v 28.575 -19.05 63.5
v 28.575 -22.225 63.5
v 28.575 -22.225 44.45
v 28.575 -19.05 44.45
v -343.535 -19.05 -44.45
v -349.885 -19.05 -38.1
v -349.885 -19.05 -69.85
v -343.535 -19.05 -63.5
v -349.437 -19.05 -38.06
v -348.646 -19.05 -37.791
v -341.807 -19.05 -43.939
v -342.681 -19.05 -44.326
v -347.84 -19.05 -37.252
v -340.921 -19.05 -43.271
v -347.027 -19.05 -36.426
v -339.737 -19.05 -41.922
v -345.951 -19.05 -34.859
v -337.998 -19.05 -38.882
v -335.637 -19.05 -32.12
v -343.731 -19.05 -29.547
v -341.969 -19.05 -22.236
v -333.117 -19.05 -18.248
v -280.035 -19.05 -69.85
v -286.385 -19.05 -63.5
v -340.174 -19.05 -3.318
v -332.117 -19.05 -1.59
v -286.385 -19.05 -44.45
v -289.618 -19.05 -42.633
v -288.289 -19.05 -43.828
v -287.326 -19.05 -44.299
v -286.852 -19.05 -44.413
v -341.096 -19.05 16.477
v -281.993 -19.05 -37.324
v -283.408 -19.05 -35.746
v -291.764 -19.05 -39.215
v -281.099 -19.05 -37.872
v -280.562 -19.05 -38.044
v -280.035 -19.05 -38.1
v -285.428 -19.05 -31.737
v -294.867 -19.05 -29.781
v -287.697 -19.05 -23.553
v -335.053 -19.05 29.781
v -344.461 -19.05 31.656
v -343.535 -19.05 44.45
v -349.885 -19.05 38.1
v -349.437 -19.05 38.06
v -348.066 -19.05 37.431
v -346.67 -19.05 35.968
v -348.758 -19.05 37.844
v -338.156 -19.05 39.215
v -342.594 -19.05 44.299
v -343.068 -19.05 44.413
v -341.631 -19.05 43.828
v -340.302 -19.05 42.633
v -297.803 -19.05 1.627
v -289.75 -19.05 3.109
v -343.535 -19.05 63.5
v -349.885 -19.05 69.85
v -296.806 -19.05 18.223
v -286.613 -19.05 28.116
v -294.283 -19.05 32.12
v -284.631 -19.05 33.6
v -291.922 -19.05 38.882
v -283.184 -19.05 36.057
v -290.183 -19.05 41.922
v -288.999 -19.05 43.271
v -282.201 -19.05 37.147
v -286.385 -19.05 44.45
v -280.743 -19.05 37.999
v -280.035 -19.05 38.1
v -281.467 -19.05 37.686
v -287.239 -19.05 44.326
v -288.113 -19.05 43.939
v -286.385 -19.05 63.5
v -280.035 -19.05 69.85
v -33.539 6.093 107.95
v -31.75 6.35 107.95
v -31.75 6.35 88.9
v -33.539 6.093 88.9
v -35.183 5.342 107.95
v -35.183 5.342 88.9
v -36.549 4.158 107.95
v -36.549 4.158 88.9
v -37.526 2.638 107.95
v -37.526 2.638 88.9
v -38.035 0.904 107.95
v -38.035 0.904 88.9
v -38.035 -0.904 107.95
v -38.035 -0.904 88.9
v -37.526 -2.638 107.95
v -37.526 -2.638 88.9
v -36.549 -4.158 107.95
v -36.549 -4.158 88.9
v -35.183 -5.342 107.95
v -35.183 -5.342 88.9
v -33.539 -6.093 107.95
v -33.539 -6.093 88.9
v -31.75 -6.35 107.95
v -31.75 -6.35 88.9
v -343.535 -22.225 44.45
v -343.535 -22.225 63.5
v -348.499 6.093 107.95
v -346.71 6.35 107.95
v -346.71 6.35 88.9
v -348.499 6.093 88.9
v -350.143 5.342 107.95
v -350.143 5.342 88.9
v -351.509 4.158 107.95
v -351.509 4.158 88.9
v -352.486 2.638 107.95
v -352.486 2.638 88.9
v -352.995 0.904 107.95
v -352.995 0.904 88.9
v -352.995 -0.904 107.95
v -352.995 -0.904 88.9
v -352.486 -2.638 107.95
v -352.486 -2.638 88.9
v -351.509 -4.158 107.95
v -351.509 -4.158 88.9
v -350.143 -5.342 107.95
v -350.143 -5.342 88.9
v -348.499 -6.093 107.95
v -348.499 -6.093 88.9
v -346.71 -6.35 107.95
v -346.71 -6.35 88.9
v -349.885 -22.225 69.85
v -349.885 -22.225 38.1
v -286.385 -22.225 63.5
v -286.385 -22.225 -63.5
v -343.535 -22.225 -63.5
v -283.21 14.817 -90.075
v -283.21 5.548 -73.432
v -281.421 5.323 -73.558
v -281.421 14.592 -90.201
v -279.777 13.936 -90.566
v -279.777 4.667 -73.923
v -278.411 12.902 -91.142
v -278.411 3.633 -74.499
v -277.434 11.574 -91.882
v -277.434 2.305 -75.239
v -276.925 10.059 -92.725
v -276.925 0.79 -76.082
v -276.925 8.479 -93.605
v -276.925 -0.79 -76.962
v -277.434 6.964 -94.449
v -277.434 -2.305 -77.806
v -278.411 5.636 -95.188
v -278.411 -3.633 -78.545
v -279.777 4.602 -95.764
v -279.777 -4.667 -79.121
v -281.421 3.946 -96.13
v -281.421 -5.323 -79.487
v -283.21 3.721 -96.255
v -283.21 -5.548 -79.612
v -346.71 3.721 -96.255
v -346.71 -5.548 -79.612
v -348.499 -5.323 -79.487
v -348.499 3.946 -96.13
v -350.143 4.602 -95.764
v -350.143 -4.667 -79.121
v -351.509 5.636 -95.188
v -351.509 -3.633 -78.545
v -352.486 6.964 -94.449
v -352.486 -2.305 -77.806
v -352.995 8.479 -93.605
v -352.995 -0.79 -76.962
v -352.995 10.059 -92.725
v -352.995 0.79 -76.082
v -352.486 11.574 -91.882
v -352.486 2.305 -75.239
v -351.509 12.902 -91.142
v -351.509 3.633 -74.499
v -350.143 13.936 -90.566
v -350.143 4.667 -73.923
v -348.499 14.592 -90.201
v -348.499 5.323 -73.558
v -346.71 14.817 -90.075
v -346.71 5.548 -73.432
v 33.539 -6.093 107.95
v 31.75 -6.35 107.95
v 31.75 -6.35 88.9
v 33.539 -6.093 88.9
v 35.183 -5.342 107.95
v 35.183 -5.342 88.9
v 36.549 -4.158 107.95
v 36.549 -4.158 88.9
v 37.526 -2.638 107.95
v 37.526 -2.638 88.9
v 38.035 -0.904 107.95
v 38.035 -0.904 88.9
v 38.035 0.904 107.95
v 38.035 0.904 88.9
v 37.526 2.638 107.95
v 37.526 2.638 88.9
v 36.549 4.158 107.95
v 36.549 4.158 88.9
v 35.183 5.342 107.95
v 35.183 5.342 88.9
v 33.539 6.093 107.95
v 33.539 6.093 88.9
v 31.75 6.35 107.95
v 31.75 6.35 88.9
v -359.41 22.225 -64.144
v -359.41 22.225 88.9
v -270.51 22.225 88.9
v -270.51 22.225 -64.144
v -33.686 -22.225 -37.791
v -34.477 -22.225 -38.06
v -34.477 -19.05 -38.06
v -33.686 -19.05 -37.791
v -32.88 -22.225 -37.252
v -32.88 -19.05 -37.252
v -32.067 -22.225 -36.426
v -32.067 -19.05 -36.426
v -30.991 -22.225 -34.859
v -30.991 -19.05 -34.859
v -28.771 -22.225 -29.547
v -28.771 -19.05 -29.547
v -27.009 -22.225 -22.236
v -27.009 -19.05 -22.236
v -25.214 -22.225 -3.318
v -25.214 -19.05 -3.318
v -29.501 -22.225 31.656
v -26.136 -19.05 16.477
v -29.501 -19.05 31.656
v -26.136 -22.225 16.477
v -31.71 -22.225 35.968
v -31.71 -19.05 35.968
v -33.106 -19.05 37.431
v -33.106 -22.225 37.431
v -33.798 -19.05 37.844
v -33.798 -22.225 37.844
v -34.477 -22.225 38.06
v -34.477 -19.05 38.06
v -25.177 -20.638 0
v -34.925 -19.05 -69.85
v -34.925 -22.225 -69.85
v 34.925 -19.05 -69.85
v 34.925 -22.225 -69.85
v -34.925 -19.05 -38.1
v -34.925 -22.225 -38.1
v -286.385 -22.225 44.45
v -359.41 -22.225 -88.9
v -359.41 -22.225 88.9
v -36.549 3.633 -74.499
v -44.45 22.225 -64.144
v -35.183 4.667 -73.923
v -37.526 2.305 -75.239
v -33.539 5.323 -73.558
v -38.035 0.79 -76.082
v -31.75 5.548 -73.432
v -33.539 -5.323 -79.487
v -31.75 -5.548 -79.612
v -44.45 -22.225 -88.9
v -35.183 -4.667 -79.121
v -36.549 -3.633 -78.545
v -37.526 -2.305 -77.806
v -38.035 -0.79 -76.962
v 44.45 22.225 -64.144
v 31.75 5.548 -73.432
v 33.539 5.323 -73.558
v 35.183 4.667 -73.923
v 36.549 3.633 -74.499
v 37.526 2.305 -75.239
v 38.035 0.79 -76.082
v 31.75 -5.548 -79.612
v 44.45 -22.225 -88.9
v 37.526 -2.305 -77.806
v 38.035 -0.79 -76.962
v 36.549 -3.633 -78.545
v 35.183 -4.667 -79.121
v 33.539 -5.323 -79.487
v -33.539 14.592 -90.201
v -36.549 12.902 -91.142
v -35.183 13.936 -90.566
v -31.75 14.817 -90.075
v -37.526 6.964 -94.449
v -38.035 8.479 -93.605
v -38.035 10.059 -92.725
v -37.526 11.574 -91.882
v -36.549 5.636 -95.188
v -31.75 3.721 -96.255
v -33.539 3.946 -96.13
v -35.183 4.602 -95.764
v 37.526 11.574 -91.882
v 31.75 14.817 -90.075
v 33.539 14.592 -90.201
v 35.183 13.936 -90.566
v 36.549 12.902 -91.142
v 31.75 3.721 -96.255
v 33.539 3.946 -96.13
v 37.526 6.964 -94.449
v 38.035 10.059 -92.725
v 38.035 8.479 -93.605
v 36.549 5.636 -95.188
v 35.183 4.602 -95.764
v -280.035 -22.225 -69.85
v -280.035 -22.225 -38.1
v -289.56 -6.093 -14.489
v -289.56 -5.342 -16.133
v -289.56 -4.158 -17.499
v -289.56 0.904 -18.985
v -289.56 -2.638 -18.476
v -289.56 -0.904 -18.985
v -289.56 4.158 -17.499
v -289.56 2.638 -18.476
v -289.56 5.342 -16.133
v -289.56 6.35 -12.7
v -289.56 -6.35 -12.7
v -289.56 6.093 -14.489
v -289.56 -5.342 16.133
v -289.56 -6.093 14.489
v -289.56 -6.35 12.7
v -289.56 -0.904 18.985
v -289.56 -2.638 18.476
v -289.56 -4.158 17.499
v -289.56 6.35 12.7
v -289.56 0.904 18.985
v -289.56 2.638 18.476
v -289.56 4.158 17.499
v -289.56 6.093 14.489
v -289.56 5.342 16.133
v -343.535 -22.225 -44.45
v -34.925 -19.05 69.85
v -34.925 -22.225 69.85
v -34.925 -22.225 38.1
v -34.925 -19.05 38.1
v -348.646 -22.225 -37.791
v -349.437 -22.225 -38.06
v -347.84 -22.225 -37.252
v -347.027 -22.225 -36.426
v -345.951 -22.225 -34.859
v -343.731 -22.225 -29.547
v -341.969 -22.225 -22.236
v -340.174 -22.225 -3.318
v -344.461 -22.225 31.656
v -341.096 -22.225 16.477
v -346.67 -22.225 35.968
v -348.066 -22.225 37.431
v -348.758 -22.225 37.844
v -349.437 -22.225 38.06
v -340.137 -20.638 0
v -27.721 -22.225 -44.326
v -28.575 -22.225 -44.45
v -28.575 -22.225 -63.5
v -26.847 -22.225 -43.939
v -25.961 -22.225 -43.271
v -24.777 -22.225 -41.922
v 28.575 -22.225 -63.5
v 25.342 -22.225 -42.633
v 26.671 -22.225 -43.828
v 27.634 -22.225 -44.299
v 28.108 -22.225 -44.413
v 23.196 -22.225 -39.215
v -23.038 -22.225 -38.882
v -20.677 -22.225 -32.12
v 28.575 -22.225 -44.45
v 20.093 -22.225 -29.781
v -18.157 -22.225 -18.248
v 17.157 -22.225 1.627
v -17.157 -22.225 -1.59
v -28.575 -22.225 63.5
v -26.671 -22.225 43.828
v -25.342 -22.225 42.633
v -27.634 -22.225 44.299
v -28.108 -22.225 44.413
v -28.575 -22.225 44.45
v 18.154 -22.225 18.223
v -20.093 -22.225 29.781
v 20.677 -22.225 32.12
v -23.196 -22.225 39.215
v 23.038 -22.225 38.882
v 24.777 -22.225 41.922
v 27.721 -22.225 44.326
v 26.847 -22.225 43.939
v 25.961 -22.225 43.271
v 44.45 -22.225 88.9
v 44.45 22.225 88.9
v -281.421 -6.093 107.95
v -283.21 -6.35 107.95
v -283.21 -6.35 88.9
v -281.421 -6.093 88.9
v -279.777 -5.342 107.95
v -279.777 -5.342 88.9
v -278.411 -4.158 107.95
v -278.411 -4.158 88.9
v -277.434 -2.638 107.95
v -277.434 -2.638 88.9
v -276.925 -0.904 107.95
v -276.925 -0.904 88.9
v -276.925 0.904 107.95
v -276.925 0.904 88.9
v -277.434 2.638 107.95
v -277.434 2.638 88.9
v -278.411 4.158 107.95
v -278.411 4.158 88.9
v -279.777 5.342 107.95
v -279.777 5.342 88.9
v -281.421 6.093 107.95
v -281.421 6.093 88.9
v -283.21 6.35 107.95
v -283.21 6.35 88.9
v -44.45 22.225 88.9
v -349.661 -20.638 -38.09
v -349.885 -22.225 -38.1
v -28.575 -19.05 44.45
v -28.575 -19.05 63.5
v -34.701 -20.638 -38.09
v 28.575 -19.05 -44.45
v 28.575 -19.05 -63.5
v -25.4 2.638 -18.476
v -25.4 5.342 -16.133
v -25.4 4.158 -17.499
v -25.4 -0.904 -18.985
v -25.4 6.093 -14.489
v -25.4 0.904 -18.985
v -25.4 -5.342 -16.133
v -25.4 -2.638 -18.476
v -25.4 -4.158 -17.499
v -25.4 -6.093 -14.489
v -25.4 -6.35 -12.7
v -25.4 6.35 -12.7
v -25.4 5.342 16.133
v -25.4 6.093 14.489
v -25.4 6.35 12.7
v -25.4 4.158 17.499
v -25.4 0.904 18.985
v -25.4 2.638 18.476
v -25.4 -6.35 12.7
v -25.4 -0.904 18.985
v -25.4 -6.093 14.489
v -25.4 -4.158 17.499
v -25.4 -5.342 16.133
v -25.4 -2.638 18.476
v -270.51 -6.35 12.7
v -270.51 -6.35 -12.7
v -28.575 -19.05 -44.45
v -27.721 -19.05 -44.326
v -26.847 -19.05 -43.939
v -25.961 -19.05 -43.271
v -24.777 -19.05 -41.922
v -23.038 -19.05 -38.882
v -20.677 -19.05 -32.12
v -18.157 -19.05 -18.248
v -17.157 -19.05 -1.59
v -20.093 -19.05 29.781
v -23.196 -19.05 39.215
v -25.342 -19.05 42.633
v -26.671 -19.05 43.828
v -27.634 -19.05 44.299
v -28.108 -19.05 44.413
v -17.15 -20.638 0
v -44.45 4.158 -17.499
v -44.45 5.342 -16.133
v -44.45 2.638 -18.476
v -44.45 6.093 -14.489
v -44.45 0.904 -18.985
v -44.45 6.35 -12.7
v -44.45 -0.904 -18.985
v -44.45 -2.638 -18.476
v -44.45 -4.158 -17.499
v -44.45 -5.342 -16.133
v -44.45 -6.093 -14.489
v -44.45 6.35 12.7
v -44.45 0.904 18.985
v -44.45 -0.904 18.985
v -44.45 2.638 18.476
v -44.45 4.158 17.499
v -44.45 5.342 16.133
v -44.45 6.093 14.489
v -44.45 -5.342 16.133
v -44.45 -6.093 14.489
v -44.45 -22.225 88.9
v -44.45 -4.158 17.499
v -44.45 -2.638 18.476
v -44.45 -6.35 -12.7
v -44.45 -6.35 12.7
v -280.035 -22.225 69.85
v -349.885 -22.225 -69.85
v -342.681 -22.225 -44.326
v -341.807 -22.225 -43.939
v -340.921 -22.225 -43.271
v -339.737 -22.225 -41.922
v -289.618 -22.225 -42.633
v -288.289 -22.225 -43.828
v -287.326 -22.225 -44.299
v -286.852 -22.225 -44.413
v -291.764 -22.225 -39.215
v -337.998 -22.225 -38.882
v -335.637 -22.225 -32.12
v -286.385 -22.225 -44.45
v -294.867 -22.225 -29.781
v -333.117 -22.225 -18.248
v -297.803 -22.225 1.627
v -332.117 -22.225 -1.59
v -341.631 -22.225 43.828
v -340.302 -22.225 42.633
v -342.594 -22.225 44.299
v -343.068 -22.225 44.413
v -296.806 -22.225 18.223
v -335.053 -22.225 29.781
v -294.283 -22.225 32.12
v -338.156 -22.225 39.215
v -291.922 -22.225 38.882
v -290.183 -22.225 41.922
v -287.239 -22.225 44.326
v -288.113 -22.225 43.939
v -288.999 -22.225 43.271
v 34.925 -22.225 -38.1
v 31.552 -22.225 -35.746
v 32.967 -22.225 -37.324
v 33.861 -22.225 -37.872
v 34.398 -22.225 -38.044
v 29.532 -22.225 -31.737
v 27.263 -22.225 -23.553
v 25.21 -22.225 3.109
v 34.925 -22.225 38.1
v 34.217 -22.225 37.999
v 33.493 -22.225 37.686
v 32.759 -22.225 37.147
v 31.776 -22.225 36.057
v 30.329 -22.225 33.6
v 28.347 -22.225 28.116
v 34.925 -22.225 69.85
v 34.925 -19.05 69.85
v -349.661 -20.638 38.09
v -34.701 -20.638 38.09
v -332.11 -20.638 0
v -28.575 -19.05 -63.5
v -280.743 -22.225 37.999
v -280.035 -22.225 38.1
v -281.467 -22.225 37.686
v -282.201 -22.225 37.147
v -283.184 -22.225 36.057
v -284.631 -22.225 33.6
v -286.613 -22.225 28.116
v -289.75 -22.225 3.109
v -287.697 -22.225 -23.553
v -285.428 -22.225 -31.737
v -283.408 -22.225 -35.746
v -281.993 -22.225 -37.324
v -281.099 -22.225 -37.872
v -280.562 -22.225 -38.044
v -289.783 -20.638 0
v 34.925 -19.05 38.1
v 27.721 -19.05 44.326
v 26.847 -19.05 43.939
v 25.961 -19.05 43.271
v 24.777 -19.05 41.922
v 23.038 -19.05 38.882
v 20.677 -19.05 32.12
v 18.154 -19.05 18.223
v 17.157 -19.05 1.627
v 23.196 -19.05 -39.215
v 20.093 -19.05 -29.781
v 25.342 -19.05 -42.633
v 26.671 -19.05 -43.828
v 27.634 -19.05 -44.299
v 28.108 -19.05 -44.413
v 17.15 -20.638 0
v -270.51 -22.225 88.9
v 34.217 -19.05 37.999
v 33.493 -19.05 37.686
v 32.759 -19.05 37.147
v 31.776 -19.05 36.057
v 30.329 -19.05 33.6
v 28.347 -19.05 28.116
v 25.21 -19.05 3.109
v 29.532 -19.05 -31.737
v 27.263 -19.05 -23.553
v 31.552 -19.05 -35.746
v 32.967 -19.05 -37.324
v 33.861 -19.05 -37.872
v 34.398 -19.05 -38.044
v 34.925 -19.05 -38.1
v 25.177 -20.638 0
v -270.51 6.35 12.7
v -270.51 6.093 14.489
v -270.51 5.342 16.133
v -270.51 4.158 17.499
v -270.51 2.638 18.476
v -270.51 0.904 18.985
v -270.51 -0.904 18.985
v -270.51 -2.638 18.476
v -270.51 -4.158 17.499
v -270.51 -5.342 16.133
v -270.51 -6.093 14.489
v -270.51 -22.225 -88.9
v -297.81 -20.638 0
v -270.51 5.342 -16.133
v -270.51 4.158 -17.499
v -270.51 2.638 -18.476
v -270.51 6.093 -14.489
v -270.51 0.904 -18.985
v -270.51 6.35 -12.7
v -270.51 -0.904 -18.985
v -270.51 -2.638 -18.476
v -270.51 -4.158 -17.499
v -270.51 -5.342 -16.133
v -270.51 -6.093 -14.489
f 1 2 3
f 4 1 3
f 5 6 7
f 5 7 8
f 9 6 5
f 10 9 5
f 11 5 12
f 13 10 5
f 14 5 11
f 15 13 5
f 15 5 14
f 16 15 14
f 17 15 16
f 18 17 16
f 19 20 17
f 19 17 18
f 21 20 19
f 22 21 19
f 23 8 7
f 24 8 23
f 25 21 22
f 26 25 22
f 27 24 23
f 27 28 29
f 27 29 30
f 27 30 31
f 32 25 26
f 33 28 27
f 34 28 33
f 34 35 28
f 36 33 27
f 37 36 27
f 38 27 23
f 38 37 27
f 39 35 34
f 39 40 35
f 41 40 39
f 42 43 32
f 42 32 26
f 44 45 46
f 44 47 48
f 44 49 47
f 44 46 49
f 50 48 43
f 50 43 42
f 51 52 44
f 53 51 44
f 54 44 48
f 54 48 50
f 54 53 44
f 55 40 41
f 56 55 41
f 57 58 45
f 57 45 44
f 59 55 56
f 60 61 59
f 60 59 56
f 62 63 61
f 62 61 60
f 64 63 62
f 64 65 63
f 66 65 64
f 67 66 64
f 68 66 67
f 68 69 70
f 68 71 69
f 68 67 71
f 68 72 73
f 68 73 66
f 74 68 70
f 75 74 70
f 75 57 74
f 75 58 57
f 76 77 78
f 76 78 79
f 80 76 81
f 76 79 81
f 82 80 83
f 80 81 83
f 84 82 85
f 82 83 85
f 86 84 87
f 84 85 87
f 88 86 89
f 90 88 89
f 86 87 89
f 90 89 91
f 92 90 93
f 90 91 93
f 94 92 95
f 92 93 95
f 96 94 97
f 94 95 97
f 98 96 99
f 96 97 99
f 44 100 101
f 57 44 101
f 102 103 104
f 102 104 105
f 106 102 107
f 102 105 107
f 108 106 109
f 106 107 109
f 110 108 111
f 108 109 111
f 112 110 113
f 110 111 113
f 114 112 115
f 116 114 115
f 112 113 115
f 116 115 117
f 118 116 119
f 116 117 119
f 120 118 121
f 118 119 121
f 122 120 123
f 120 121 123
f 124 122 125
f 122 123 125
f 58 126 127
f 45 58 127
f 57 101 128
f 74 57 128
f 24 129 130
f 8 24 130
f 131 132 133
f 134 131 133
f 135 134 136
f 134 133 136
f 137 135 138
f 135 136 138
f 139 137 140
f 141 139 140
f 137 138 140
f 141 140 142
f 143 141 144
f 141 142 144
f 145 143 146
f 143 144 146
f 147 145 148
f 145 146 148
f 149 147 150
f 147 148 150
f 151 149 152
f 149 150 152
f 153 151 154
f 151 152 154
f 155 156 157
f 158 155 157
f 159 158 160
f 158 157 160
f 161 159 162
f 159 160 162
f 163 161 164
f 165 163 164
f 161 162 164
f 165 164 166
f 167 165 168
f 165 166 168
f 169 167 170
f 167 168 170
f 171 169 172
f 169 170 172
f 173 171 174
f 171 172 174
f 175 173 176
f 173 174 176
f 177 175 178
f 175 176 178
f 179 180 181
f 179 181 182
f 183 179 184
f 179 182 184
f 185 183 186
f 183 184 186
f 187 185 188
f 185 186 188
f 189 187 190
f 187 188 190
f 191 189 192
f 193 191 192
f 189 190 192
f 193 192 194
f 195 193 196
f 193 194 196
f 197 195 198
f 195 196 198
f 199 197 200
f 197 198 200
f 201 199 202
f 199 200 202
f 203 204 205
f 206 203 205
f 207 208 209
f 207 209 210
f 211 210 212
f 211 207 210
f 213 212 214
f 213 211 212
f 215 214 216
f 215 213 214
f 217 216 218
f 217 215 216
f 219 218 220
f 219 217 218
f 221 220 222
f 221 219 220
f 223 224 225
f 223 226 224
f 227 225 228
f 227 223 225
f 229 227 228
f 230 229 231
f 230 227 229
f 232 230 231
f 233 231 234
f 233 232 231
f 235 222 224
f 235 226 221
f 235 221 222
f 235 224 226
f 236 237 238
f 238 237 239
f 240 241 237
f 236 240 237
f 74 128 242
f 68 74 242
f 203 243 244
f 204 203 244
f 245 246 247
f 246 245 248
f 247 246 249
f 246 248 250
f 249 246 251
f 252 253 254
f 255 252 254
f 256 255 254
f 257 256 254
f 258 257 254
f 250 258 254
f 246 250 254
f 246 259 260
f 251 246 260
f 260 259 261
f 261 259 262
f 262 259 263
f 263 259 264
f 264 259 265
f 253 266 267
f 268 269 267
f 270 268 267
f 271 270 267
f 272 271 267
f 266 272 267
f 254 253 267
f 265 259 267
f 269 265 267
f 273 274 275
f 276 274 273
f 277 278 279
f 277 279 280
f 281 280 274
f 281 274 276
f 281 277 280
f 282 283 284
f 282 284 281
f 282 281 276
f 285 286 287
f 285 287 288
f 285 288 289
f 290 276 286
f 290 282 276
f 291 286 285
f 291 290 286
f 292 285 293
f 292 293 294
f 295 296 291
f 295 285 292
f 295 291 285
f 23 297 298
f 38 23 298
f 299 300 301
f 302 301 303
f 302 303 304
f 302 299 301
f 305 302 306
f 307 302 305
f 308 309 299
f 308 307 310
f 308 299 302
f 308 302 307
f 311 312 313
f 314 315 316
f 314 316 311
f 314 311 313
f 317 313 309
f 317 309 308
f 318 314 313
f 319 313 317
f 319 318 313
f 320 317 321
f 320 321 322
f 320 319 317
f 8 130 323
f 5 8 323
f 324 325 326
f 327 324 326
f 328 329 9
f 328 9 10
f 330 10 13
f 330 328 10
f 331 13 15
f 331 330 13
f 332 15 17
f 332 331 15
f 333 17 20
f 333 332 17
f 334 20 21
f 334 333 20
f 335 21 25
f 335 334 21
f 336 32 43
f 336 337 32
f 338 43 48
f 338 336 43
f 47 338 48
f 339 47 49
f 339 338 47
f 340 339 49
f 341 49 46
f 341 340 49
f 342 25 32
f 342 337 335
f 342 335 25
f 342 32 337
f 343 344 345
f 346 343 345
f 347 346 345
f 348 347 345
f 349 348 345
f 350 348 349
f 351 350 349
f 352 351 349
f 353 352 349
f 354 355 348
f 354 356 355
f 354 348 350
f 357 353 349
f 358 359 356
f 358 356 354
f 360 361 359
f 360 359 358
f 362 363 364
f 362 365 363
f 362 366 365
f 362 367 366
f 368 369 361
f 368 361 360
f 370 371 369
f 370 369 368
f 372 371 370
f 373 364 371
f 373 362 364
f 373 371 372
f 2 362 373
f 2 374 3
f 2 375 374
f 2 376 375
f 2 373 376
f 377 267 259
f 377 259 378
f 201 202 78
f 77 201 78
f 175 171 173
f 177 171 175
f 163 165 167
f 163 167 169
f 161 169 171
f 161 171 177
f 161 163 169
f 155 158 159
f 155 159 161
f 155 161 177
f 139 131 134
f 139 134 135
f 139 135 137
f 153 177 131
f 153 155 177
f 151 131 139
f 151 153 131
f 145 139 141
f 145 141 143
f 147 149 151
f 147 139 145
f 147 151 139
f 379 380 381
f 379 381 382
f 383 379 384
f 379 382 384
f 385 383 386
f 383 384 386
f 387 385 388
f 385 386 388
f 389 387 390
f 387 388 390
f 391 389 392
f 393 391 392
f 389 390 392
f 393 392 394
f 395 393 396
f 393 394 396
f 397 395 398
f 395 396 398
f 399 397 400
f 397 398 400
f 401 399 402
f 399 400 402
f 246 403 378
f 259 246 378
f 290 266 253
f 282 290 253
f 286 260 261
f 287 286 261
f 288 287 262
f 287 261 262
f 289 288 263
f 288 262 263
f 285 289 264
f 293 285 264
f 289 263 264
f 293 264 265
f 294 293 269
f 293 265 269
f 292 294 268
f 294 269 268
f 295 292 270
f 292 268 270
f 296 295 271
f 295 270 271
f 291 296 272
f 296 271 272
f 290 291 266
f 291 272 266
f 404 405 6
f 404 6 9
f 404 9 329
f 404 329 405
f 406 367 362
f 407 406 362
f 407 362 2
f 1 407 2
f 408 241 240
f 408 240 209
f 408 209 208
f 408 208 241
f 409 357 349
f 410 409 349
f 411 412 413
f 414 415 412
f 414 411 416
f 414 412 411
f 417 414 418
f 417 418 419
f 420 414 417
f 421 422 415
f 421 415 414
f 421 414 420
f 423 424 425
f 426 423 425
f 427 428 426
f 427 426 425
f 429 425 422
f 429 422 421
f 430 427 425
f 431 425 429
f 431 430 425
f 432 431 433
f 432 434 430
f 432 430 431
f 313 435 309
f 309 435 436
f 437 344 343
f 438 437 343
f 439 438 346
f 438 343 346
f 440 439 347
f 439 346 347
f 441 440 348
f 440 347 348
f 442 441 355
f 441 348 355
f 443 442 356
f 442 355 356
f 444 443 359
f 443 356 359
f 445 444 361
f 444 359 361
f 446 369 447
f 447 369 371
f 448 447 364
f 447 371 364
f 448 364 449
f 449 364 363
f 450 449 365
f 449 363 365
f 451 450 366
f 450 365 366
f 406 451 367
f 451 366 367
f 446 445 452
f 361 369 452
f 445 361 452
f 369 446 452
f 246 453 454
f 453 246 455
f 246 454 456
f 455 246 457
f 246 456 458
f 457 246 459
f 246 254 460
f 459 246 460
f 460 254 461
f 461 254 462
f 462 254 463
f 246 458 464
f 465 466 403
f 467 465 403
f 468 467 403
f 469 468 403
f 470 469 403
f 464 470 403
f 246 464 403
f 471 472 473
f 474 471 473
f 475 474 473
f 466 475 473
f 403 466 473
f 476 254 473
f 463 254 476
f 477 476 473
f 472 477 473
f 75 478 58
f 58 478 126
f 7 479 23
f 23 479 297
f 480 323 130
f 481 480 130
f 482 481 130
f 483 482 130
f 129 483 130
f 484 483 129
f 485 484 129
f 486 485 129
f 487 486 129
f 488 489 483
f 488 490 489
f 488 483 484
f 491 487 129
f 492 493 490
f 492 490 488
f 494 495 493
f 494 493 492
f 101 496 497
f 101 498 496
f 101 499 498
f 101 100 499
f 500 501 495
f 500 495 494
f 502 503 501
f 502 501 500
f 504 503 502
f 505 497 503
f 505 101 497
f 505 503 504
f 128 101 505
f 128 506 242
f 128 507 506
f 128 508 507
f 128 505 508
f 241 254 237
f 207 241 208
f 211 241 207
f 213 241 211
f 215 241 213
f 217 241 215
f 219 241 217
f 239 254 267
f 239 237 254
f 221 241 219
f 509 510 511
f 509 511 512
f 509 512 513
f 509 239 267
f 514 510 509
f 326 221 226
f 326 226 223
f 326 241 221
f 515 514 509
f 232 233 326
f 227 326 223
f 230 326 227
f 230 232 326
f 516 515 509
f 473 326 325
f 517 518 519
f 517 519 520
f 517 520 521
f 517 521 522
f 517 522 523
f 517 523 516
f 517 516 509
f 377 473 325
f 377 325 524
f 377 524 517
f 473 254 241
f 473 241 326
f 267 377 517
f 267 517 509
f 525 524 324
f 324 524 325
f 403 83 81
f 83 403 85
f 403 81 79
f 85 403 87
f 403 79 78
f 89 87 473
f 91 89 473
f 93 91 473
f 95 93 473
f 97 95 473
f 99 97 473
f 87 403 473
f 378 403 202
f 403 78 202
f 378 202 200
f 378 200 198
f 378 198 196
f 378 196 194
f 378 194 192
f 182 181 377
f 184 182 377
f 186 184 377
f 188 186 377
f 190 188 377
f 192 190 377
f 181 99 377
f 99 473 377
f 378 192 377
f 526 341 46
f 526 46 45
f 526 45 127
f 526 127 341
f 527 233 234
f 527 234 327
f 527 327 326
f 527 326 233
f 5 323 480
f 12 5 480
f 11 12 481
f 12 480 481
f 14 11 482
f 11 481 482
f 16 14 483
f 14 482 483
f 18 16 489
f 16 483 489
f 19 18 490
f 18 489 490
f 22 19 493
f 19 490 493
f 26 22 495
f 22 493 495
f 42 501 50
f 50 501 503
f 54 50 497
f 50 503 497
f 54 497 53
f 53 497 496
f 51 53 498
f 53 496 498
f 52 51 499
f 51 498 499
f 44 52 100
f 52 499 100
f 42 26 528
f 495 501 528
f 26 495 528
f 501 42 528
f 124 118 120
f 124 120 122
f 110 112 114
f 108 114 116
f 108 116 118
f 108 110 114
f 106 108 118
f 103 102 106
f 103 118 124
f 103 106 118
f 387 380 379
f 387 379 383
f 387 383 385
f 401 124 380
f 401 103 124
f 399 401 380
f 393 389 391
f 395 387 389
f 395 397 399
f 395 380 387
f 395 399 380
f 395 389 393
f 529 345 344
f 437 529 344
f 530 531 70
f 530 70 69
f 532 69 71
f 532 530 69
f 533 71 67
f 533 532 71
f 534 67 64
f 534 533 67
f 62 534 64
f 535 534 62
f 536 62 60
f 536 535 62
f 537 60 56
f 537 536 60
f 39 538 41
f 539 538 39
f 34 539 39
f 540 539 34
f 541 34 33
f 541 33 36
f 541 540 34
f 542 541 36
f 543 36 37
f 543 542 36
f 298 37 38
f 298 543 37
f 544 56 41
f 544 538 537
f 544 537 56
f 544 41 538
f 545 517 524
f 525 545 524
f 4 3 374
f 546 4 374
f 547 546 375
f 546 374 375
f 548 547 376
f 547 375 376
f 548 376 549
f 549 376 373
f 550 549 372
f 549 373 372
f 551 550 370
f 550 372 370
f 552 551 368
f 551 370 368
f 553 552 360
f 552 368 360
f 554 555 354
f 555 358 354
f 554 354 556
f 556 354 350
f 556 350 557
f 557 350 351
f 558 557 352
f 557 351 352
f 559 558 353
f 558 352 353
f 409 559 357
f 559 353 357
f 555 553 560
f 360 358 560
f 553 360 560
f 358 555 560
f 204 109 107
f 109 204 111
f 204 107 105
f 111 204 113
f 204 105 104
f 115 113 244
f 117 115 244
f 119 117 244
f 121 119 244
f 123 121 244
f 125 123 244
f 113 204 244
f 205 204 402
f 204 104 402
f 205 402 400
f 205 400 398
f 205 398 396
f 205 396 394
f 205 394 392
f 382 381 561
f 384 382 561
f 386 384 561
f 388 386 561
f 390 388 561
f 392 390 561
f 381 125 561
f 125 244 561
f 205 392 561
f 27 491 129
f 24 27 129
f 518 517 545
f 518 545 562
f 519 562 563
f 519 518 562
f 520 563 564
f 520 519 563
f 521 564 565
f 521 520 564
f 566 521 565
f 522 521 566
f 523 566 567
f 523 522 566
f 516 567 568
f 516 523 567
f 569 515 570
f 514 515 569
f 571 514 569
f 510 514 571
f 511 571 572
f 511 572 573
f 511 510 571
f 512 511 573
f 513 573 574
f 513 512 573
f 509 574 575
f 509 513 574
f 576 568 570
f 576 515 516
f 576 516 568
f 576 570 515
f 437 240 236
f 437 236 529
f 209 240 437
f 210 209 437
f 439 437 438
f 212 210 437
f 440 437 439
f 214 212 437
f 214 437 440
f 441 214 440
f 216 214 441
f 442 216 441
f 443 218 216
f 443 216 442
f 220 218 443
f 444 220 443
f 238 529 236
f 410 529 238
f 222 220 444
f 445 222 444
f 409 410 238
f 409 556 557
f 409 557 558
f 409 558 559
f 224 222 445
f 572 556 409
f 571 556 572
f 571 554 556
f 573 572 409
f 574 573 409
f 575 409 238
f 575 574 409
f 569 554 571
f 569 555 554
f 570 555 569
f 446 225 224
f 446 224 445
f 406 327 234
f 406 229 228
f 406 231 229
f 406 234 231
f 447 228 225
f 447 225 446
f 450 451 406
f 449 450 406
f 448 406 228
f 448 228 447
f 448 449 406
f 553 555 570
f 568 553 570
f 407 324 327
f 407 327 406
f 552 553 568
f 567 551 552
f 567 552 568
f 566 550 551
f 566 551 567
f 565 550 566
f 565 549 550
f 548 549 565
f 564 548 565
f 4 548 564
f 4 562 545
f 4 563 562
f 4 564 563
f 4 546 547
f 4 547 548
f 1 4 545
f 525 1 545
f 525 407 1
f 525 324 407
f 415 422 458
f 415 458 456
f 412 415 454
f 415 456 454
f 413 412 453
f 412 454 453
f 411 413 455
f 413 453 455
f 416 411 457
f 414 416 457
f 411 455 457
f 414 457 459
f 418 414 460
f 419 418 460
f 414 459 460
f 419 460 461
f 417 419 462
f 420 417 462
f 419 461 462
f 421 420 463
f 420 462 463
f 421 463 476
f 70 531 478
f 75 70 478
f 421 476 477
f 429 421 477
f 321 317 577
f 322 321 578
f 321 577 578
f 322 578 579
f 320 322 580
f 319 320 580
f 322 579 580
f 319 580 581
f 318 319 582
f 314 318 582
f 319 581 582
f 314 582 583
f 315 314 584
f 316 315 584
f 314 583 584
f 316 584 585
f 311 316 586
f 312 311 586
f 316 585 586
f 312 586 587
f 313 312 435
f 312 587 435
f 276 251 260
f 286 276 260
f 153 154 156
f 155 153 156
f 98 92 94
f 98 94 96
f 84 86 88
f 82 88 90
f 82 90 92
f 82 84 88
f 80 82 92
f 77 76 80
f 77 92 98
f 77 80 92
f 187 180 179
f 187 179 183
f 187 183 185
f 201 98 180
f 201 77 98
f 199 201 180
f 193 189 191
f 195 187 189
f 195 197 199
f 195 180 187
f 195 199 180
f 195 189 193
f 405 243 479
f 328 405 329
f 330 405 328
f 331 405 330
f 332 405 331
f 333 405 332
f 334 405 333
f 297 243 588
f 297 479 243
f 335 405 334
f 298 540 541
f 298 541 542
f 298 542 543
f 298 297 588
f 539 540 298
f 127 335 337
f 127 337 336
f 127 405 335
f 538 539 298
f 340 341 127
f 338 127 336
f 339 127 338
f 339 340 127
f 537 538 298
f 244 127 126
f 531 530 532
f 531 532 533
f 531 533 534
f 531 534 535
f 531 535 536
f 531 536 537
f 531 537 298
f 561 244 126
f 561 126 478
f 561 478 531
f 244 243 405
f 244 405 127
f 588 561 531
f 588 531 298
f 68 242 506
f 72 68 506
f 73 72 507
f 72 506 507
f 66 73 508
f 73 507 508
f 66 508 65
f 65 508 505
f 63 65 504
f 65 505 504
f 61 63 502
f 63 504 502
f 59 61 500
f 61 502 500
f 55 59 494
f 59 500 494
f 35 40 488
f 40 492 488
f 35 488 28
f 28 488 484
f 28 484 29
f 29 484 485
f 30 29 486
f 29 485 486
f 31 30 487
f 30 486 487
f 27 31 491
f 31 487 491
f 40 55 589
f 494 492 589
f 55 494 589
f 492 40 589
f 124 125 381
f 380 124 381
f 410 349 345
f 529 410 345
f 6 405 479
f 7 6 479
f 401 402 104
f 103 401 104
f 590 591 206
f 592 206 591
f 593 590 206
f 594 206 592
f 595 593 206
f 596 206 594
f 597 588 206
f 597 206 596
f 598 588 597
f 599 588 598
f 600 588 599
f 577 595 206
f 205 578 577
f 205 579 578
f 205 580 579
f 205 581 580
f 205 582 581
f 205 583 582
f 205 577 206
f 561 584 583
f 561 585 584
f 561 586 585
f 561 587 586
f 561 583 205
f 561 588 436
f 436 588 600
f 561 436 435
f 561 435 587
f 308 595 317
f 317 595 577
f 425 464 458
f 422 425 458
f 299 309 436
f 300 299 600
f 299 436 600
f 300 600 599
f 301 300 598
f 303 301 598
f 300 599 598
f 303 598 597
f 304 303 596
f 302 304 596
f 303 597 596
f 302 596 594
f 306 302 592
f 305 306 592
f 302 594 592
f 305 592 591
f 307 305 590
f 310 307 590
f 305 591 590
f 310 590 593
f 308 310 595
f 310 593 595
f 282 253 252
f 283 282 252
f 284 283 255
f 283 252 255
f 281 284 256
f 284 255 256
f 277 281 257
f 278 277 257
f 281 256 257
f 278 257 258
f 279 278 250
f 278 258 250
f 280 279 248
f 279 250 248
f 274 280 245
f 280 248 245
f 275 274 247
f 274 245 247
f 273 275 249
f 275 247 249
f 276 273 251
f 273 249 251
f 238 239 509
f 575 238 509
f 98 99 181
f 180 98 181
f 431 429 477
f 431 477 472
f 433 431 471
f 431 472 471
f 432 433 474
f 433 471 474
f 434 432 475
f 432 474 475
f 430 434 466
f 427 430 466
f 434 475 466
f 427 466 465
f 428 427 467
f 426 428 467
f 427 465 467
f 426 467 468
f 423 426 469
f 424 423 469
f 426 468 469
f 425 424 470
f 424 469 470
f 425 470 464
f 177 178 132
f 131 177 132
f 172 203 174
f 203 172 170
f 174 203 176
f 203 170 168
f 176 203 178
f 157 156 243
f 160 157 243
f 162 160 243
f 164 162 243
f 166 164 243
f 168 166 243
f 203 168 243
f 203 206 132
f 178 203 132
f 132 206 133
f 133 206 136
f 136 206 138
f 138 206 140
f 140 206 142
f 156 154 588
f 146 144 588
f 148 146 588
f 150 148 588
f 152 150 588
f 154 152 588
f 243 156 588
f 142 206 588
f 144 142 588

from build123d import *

# Parameters (mm, degrees)
F0_W      = 88.9
F0_H      = 177.8
F1_DEPTH  = 22.225
F3_DEPTH  = 19.05
F5_DEPTH  = 3.175
F7_DEPTH  = 88.9
F9_DEPTH  = 19.05
F12_DEPTH = 19.05
F14_DEPTH = 19.05


with BuildPart() as f1:
    # F0 (on Front) → F1 (new body, symmetric)
    with BuildSketch(Plane.XZ):
        Rectangle(F0_W, F0_H)
    extrude(amount=F1_DEPTH, both=True)

    # F2 (on face) → F3 (join)
    with BuildSketch(Plane.XY.offset(88.9)):
        with BuildLine():
            Line((31.75, 6.35), (-31.75, 6.35))
            ThreePointArc((-31.75, 6.35), (-38.1, 0), (-31.75, -6.35))
            Line((-31.75, -6.35), (31.75, -6.35))
            ThreePointArc((31.75, -6.35), (38.1, 0), (31.75, 6.35))
        make_face()
    extrude(amount=F3_DEPTH)

    # F4 (on face) → F5 (cut)
    with BuildSketch(Plane.XZ.offset(22.225)):
        with BuildLine():
            Line((34.925, 69.85), (-34.925, 69.85))
            Line((-34.925, 69.85), (-34.925, 38.1))
            add(Edge.make_bspline(
                [(-34.4770654637, 38.0597534694), (-34.7009143766, 38.1), (-34.925, 38.1)],
                knots=[6.2372173746, 6.2372173746, 6.2372173746, 6.2831853072, 6.2831853072, 6.2831853072], degree=2, weights=[1, 0.9997358803, 1]))
            add(Edge.make_bspline(
                [(-34.4770654637, -38.0597534694), (-25.1770670159, -36.3876762294), (-25.1770670159, 0), (-25.1770670159, 36.3876762294), (-34.4770654637, 38.0597534694)],
                knots=[3.1875605862, 3.1875605862, 3.1875605862, 4.7123889804, 4.7123889804, 6.2372173746, 6.2372173746, 6.2372173746], degree=2, weights=[1, 0.7231707079, 1, 0.7231707079, 1]))
            add(Edge.make_bspline(
                [(-34.925, -38.1), (-34.7009143766, -38.1), (-34.4770654637, -38.0597534694)],
                knots=[3.1415926536, 3.1415926536, 3.1415926536, 3.1875605862, 3.1875605862, 3.1875605862], degree=2, weights=[1, 0.9997358803, 1]))
            Line((-34.925, -38.1), (-34.925, -69.85))
            Line((-34.925, -69.85), (34.925, -69.85))
            Line((34.925, -69.85), (34.925, -38.1))
            add(Edge.make_bspline(
                [(34.925, 38.1), (25.1770670159, 38.1), (25.1770670159, 0), (25.1770670159, -38.1), (34.925, -38.1)],
                knots=[0, 0, 0, 1.5707963268, 1.5707963268, 3.1415926536, 3.1415926536, 3.1415926536], degree=2, weights=[1, 0.7071067812, 1, 0.7071067812, 1]))
            Line((34.925, 38.1), (34.925, 69.85))
        make_face()
        with BuildLine():
            Line((-28.575, 44.45), (-28.575, 63.5))
            Line((-28.575, 63.5), (28.575, 63.5))
            Line((28.575, 63.5), (28.575, 44.45))
            add(Edge.make_bspline(
                [(28.575, 44.45), (17.149786189, 44.45), (17.149786189, 0), (17.149786189, -44.45), (28.575, -44.45)],
                knots=[0, 0, 0, 1.5707963268, 1.5707963268, 3.1415926536, 3.1415926536, 3.1415926536], degree=2, weights=[1, 0.7071067812, 1, 0.7071067812, 1]))
            Line((28.575, -44.45), (28.575, -63.5))
            Line((28.575, -63.5), (-28.575, -63.5))
            Line((-28.575, -63.5), (-28.575, -44.45))
            add(Edge.make_bspline(
                [(-28.575, -44.45), (-17.149786189, -44.45), (-17.149786189, 0), (-17.149786189, 44.45), (-28.575, 44.45)],
                knots=[3.1415926536, 3.1415926536, 3.1415926536, 4.7123889804, 4.7123889804, 6.2831853072, 6.2831853072, 6.2831853072], degree=2, weights=[1, 0.7071067812, 1, 0.7071067812, 1]))
        make_face(mode=Mode.SUBTRACT)
    extrude(amount=-F5_DEPTH, mode=Mode.SUBTRACT)

    # F6 (on face) → F7 (cut)
    with BuildSketch(Plane.YZ.offset(44.45)):
        Polygon((22.225, -64.1443201671), (-22.225, -88.9), (22.225, -88.9), align=None)
    extrude(amount=-F7_DEPTH, mode=Mode.SUBTRACT)

    # F8 (on face) → F9 (join)
    with BuildSketch(Plane(origin=(0, 32.528283645, -58.4060796465), x_dir=(1, 0, 0), z_dir=(0, 0.4865623605, -0.8736458489))):
        with BuildLine():
            ThreePointArc((-31.75, 43.5828028396), (-38.1, 37.2328028396), (-31.75, 30.8828028396))
            Line((-31.75, 30.8828028396), (31.75, 30.8828028396))
            ThreePointArc((31.75, 30.8828028396), (38.1, 37.2328028396), (31.75, 43.5828028396))
            Line((31.75, 43.5828028396), (-31.75, 43.5828028396))
        make_face()
    extrude(amount=F9_DEPTH)


with BuildPart() as f10_1:
    # F10: copy of F1
    add(f1.part.moved(Location((-314.96, 0, 0))))

    # F13 (on face) → F14 (cut)
    with BuildSketch(Plane.YZ.offset(-270.51)):
        with BuildLine():
            ThreePointArc((-6.35, -12.7000034092), (0, -19.0500034092), (6.35, -12.7000034092))
            Line((6.35, -12.7000034092), (6.35, 12.6999965908))
            ThreePointArc((6.35, 12.6999965908), (0, 19.0499965908), (-6.35, 12.6999965908))
            Line((-6.35, 12.6999965908), (-6.35, -12.7000034092))
        make_face()
    extrude(amount=-F14_DEPTH, mode=Mode.SUBTRACT)


with BuildPart() as f1_1:
    add(f1.part)

    # F11 (on face) → F12 (cut)
    with BuildSketch(Plane(origin=(-44.45, 0, 0), x_dir=(0, -1, 0), z_dir=(-1, 0, 0))):
        with BuildLine():
            ThreePointArc((-6.35, -12.7), (0, -19.05), (6.35, -12.7))
            Line((6.35, -12.7), (6.35, 12.7))
            ThreePointArc((6.35, 12.7), (0, 19.05), (-6.35, 12.7))
            Line((-6.35, 12.7), (-6.35, -12.7))
        make_face()
    extrude(amount=-F12_DEPTH, mode=Mode.SUBTRACT)


solid = Compound([f10_1.part, f1_1.part])
